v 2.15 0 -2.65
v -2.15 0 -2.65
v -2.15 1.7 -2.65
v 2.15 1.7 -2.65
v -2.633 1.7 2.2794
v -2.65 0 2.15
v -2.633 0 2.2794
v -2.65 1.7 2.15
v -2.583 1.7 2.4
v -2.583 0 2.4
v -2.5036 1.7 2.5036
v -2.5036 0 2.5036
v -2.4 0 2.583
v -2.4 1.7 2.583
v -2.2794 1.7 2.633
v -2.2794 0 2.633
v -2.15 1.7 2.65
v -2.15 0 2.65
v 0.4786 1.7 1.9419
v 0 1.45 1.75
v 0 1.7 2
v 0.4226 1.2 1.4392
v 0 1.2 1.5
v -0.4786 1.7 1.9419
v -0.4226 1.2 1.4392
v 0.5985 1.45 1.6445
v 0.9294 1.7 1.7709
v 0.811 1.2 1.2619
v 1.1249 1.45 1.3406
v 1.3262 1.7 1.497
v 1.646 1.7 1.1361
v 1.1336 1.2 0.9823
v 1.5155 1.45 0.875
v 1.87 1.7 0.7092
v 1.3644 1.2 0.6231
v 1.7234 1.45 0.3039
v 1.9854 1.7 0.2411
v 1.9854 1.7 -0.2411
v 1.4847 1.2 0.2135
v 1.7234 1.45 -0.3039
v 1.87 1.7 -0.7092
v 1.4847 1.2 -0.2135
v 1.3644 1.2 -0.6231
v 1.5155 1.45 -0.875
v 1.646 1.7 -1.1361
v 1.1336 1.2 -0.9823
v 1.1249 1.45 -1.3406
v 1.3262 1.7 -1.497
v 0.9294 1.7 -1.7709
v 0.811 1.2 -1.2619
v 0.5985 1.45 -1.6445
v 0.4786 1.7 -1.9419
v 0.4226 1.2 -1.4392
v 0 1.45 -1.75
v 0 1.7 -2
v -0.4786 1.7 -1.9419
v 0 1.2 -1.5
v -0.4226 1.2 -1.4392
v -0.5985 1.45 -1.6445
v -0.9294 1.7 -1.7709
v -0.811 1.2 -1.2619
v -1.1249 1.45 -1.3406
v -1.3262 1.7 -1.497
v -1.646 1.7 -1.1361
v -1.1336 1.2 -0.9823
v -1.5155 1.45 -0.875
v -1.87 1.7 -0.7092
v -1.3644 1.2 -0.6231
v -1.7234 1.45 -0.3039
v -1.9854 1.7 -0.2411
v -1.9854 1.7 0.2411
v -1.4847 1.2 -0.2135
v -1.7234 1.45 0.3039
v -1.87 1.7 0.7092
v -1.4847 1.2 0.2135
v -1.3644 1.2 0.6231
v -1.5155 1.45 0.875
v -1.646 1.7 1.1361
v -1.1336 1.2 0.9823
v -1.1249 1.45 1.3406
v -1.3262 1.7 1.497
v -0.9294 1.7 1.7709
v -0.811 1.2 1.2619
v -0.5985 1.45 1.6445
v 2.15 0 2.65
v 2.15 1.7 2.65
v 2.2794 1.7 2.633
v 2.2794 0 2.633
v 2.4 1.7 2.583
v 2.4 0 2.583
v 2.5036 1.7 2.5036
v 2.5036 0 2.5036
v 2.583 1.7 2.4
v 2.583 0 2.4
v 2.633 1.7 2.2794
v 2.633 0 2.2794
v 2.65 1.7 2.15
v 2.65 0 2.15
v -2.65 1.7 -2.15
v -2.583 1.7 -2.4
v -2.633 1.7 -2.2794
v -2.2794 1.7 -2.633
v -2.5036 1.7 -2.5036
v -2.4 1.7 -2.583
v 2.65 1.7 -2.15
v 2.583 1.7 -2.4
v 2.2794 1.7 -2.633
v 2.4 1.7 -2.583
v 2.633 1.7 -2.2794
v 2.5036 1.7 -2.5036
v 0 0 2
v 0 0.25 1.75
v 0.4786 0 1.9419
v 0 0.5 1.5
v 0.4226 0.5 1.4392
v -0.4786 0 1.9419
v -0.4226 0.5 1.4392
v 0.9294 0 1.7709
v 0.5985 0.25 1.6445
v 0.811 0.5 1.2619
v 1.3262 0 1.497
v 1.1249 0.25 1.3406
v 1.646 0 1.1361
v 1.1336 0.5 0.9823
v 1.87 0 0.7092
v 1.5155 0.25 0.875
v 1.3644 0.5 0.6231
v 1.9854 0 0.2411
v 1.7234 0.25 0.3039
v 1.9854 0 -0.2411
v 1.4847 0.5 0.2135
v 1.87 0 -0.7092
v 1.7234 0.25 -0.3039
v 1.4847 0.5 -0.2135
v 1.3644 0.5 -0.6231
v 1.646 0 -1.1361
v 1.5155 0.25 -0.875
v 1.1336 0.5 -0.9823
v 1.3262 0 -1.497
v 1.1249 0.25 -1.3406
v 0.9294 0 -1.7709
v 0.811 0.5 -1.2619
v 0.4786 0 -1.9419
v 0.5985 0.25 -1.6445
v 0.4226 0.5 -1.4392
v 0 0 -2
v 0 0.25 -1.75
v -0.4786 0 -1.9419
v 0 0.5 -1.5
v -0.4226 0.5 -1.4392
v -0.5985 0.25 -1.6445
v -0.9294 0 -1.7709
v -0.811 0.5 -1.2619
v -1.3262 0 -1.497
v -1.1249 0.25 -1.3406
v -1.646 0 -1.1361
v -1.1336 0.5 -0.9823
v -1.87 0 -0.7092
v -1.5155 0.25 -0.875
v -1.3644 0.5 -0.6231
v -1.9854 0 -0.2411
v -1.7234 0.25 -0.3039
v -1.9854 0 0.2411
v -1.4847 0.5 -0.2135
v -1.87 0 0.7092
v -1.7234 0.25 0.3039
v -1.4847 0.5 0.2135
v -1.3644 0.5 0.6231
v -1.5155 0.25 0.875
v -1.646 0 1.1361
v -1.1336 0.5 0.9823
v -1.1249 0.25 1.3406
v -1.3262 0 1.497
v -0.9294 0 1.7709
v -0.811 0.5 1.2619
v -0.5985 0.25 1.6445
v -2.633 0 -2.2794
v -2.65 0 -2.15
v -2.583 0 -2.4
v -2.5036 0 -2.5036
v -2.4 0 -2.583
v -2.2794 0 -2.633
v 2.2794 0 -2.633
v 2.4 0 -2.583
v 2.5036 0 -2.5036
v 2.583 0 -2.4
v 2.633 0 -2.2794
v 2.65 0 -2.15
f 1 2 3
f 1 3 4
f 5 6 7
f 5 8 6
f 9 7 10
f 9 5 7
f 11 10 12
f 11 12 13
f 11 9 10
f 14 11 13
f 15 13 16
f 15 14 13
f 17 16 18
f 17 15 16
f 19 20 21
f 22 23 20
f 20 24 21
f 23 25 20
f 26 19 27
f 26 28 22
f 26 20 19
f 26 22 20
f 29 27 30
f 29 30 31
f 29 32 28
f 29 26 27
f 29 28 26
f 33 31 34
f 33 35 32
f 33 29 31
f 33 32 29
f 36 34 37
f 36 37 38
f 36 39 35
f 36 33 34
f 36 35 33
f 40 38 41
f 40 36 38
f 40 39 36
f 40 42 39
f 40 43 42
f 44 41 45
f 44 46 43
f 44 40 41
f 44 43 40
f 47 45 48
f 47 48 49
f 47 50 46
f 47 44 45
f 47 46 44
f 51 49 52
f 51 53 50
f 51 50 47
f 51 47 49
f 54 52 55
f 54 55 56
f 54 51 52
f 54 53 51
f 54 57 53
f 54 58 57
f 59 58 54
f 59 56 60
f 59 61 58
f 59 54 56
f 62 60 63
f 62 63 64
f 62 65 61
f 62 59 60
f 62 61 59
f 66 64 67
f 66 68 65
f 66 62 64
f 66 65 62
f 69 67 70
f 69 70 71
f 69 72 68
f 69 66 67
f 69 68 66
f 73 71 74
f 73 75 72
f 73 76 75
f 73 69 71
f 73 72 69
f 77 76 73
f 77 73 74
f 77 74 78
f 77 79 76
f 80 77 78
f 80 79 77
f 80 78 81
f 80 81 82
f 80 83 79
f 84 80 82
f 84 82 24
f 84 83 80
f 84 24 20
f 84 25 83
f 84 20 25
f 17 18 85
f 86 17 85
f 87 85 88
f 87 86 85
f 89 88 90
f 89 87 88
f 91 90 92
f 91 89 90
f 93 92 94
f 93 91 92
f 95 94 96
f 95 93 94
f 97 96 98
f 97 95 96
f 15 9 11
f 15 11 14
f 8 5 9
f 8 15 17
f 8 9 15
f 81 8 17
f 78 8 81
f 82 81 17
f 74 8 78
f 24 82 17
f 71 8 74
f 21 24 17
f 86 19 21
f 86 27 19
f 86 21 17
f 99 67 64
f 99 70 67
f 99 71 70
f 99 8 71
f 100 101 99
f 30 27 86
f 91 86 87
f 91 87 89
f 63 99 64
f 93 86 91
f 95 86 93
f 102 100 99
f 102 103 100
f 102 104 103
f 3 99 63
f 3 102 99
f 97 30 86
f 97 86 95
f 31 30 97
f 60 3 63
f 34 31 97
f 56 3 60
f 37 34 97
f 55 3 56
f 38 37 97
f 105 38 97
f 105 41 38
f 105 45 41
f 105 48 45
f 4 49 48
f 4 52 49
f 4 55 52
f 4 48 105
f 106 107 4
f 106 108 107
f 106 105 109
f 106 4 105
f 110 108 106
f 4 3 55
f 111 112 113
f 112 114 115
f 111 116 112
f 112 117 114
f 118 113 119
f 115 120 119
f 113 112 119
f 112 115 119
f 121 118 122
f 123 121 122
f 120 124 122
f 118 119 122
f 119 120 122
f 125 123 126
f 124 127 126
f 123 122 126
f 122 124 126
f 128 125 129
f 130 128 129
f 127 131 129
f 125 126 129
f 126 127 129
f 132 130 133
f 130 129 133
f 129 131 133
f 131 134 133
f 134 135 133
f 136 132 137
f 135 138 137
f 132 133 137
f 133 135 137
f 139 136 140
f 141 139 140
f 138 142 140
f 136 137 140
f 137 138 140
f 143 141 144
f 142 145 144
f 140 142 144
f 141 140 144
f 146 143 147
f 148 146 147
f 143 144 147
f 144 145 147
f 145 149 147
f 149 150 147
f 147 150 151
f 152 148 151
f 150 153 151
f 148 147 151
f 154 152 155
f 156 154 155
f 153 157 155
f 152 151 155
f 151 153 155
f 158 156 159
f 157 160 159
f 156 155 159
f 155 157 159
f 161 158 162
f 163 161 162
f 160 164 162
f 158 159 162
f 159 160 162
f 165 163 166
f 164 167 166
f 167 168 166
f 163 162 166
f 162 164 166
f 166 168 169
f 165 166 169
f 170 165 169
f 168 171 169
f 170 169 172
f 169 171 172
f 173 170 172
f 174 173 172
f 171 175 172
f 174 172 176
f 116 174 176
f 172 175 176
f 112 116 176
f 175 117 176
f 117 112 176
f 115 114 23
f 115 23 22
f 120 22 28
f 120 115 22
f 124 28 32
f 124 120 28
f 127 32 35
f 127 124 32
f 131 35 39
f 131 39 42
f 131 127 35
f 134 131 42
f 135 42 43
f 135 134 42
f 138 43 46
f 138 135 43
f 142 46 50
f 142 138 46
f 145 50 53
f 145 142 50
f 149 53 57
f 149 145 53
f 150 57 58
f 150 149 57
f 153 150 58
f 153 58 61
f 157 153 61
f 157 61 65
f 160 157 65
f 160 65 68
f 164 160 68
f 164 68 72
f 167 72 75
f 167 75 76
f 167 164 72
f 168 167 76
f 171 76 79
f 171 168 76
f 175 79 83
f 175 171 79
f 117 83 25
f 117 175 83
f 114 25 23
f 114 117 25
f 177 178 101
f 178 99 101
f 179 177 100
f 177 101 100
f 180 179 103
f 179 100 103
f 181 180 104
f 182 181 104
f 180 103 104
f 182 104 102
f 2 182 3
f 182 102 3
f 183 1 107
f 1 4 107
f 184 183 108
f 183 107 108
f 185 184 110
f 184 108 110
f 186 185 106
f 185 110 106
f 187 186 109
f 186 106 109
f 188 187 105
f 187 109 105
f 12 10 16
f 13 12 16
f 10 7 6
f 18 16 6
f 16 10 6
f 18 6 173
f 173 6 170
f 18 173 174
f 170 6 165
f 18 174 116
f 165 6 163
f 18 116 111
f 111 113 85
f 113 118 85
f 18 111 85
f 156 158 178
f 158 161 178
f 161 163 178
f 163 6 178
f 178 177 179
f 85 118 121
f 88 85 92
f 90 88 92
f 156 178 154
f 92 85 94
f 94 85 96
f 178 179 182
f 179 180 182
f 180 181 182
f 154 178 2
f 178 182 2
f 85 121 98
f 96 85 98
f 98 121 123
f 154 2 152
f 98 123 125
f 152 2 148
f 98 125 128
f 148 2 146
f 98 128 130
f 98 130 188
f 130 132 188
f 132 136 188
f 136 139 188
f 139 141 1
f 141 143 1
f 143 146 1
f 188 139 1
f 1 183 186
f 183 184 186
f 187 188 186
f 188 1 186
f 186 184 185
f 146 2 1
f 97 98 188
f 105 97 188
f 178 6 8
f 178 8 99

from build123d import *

# Parameters (mm, degrees)
SKETCH1_W           = 5.3
SKETCH1_H           = 5.3
SKETCH1_R           = 1.5
BOSS_EXTRUDE1_DEPTH = 1.7
FILLET1_R           = 0.5
CHAMFER1_SIZE       = 0.5


with BuildPart() as part:
    # Sketch1 → Boss-Extrude1 (new body)
    with BuildSketch(Plane(origin=(0, 0, 0), x_dir=(1, 0, 0), z_dir=(0, 1, 0))):
        Rectangle(SKETCH1_W, SKETCH1_H)
        with Locations(Location((0, 0, 0), (0, 0, 270))):
            Circle(SKETCH1_R, mode=Mode.SUBTRACT)
    extrude(amount=BOSS_EXTRUDE1_DEPTH)

    # Fillet1
    fillet1_edges = [part.edges().sort_by_distance(p)[0] for p in [
        (2.65, 0.85, 2.65),
        (-2.65, 0.85, 2.65),
        (-2.65, 0.85, -2.65),
        (2.65, 0.85, -2.65),
    ]]
    fillet(fillet1_edges, radius=FILLET1_R)

    # Chamfer1
    chamfer1_edges = [part.edges().sort_by_distance(p)[0] for p in [
        (0, 0, -1.5),
        (0, 1.7, -1.5),
    ]]
    chamfer(chamfer1_edges, length=CHAMFER1_SIZE)


solid = part.part
